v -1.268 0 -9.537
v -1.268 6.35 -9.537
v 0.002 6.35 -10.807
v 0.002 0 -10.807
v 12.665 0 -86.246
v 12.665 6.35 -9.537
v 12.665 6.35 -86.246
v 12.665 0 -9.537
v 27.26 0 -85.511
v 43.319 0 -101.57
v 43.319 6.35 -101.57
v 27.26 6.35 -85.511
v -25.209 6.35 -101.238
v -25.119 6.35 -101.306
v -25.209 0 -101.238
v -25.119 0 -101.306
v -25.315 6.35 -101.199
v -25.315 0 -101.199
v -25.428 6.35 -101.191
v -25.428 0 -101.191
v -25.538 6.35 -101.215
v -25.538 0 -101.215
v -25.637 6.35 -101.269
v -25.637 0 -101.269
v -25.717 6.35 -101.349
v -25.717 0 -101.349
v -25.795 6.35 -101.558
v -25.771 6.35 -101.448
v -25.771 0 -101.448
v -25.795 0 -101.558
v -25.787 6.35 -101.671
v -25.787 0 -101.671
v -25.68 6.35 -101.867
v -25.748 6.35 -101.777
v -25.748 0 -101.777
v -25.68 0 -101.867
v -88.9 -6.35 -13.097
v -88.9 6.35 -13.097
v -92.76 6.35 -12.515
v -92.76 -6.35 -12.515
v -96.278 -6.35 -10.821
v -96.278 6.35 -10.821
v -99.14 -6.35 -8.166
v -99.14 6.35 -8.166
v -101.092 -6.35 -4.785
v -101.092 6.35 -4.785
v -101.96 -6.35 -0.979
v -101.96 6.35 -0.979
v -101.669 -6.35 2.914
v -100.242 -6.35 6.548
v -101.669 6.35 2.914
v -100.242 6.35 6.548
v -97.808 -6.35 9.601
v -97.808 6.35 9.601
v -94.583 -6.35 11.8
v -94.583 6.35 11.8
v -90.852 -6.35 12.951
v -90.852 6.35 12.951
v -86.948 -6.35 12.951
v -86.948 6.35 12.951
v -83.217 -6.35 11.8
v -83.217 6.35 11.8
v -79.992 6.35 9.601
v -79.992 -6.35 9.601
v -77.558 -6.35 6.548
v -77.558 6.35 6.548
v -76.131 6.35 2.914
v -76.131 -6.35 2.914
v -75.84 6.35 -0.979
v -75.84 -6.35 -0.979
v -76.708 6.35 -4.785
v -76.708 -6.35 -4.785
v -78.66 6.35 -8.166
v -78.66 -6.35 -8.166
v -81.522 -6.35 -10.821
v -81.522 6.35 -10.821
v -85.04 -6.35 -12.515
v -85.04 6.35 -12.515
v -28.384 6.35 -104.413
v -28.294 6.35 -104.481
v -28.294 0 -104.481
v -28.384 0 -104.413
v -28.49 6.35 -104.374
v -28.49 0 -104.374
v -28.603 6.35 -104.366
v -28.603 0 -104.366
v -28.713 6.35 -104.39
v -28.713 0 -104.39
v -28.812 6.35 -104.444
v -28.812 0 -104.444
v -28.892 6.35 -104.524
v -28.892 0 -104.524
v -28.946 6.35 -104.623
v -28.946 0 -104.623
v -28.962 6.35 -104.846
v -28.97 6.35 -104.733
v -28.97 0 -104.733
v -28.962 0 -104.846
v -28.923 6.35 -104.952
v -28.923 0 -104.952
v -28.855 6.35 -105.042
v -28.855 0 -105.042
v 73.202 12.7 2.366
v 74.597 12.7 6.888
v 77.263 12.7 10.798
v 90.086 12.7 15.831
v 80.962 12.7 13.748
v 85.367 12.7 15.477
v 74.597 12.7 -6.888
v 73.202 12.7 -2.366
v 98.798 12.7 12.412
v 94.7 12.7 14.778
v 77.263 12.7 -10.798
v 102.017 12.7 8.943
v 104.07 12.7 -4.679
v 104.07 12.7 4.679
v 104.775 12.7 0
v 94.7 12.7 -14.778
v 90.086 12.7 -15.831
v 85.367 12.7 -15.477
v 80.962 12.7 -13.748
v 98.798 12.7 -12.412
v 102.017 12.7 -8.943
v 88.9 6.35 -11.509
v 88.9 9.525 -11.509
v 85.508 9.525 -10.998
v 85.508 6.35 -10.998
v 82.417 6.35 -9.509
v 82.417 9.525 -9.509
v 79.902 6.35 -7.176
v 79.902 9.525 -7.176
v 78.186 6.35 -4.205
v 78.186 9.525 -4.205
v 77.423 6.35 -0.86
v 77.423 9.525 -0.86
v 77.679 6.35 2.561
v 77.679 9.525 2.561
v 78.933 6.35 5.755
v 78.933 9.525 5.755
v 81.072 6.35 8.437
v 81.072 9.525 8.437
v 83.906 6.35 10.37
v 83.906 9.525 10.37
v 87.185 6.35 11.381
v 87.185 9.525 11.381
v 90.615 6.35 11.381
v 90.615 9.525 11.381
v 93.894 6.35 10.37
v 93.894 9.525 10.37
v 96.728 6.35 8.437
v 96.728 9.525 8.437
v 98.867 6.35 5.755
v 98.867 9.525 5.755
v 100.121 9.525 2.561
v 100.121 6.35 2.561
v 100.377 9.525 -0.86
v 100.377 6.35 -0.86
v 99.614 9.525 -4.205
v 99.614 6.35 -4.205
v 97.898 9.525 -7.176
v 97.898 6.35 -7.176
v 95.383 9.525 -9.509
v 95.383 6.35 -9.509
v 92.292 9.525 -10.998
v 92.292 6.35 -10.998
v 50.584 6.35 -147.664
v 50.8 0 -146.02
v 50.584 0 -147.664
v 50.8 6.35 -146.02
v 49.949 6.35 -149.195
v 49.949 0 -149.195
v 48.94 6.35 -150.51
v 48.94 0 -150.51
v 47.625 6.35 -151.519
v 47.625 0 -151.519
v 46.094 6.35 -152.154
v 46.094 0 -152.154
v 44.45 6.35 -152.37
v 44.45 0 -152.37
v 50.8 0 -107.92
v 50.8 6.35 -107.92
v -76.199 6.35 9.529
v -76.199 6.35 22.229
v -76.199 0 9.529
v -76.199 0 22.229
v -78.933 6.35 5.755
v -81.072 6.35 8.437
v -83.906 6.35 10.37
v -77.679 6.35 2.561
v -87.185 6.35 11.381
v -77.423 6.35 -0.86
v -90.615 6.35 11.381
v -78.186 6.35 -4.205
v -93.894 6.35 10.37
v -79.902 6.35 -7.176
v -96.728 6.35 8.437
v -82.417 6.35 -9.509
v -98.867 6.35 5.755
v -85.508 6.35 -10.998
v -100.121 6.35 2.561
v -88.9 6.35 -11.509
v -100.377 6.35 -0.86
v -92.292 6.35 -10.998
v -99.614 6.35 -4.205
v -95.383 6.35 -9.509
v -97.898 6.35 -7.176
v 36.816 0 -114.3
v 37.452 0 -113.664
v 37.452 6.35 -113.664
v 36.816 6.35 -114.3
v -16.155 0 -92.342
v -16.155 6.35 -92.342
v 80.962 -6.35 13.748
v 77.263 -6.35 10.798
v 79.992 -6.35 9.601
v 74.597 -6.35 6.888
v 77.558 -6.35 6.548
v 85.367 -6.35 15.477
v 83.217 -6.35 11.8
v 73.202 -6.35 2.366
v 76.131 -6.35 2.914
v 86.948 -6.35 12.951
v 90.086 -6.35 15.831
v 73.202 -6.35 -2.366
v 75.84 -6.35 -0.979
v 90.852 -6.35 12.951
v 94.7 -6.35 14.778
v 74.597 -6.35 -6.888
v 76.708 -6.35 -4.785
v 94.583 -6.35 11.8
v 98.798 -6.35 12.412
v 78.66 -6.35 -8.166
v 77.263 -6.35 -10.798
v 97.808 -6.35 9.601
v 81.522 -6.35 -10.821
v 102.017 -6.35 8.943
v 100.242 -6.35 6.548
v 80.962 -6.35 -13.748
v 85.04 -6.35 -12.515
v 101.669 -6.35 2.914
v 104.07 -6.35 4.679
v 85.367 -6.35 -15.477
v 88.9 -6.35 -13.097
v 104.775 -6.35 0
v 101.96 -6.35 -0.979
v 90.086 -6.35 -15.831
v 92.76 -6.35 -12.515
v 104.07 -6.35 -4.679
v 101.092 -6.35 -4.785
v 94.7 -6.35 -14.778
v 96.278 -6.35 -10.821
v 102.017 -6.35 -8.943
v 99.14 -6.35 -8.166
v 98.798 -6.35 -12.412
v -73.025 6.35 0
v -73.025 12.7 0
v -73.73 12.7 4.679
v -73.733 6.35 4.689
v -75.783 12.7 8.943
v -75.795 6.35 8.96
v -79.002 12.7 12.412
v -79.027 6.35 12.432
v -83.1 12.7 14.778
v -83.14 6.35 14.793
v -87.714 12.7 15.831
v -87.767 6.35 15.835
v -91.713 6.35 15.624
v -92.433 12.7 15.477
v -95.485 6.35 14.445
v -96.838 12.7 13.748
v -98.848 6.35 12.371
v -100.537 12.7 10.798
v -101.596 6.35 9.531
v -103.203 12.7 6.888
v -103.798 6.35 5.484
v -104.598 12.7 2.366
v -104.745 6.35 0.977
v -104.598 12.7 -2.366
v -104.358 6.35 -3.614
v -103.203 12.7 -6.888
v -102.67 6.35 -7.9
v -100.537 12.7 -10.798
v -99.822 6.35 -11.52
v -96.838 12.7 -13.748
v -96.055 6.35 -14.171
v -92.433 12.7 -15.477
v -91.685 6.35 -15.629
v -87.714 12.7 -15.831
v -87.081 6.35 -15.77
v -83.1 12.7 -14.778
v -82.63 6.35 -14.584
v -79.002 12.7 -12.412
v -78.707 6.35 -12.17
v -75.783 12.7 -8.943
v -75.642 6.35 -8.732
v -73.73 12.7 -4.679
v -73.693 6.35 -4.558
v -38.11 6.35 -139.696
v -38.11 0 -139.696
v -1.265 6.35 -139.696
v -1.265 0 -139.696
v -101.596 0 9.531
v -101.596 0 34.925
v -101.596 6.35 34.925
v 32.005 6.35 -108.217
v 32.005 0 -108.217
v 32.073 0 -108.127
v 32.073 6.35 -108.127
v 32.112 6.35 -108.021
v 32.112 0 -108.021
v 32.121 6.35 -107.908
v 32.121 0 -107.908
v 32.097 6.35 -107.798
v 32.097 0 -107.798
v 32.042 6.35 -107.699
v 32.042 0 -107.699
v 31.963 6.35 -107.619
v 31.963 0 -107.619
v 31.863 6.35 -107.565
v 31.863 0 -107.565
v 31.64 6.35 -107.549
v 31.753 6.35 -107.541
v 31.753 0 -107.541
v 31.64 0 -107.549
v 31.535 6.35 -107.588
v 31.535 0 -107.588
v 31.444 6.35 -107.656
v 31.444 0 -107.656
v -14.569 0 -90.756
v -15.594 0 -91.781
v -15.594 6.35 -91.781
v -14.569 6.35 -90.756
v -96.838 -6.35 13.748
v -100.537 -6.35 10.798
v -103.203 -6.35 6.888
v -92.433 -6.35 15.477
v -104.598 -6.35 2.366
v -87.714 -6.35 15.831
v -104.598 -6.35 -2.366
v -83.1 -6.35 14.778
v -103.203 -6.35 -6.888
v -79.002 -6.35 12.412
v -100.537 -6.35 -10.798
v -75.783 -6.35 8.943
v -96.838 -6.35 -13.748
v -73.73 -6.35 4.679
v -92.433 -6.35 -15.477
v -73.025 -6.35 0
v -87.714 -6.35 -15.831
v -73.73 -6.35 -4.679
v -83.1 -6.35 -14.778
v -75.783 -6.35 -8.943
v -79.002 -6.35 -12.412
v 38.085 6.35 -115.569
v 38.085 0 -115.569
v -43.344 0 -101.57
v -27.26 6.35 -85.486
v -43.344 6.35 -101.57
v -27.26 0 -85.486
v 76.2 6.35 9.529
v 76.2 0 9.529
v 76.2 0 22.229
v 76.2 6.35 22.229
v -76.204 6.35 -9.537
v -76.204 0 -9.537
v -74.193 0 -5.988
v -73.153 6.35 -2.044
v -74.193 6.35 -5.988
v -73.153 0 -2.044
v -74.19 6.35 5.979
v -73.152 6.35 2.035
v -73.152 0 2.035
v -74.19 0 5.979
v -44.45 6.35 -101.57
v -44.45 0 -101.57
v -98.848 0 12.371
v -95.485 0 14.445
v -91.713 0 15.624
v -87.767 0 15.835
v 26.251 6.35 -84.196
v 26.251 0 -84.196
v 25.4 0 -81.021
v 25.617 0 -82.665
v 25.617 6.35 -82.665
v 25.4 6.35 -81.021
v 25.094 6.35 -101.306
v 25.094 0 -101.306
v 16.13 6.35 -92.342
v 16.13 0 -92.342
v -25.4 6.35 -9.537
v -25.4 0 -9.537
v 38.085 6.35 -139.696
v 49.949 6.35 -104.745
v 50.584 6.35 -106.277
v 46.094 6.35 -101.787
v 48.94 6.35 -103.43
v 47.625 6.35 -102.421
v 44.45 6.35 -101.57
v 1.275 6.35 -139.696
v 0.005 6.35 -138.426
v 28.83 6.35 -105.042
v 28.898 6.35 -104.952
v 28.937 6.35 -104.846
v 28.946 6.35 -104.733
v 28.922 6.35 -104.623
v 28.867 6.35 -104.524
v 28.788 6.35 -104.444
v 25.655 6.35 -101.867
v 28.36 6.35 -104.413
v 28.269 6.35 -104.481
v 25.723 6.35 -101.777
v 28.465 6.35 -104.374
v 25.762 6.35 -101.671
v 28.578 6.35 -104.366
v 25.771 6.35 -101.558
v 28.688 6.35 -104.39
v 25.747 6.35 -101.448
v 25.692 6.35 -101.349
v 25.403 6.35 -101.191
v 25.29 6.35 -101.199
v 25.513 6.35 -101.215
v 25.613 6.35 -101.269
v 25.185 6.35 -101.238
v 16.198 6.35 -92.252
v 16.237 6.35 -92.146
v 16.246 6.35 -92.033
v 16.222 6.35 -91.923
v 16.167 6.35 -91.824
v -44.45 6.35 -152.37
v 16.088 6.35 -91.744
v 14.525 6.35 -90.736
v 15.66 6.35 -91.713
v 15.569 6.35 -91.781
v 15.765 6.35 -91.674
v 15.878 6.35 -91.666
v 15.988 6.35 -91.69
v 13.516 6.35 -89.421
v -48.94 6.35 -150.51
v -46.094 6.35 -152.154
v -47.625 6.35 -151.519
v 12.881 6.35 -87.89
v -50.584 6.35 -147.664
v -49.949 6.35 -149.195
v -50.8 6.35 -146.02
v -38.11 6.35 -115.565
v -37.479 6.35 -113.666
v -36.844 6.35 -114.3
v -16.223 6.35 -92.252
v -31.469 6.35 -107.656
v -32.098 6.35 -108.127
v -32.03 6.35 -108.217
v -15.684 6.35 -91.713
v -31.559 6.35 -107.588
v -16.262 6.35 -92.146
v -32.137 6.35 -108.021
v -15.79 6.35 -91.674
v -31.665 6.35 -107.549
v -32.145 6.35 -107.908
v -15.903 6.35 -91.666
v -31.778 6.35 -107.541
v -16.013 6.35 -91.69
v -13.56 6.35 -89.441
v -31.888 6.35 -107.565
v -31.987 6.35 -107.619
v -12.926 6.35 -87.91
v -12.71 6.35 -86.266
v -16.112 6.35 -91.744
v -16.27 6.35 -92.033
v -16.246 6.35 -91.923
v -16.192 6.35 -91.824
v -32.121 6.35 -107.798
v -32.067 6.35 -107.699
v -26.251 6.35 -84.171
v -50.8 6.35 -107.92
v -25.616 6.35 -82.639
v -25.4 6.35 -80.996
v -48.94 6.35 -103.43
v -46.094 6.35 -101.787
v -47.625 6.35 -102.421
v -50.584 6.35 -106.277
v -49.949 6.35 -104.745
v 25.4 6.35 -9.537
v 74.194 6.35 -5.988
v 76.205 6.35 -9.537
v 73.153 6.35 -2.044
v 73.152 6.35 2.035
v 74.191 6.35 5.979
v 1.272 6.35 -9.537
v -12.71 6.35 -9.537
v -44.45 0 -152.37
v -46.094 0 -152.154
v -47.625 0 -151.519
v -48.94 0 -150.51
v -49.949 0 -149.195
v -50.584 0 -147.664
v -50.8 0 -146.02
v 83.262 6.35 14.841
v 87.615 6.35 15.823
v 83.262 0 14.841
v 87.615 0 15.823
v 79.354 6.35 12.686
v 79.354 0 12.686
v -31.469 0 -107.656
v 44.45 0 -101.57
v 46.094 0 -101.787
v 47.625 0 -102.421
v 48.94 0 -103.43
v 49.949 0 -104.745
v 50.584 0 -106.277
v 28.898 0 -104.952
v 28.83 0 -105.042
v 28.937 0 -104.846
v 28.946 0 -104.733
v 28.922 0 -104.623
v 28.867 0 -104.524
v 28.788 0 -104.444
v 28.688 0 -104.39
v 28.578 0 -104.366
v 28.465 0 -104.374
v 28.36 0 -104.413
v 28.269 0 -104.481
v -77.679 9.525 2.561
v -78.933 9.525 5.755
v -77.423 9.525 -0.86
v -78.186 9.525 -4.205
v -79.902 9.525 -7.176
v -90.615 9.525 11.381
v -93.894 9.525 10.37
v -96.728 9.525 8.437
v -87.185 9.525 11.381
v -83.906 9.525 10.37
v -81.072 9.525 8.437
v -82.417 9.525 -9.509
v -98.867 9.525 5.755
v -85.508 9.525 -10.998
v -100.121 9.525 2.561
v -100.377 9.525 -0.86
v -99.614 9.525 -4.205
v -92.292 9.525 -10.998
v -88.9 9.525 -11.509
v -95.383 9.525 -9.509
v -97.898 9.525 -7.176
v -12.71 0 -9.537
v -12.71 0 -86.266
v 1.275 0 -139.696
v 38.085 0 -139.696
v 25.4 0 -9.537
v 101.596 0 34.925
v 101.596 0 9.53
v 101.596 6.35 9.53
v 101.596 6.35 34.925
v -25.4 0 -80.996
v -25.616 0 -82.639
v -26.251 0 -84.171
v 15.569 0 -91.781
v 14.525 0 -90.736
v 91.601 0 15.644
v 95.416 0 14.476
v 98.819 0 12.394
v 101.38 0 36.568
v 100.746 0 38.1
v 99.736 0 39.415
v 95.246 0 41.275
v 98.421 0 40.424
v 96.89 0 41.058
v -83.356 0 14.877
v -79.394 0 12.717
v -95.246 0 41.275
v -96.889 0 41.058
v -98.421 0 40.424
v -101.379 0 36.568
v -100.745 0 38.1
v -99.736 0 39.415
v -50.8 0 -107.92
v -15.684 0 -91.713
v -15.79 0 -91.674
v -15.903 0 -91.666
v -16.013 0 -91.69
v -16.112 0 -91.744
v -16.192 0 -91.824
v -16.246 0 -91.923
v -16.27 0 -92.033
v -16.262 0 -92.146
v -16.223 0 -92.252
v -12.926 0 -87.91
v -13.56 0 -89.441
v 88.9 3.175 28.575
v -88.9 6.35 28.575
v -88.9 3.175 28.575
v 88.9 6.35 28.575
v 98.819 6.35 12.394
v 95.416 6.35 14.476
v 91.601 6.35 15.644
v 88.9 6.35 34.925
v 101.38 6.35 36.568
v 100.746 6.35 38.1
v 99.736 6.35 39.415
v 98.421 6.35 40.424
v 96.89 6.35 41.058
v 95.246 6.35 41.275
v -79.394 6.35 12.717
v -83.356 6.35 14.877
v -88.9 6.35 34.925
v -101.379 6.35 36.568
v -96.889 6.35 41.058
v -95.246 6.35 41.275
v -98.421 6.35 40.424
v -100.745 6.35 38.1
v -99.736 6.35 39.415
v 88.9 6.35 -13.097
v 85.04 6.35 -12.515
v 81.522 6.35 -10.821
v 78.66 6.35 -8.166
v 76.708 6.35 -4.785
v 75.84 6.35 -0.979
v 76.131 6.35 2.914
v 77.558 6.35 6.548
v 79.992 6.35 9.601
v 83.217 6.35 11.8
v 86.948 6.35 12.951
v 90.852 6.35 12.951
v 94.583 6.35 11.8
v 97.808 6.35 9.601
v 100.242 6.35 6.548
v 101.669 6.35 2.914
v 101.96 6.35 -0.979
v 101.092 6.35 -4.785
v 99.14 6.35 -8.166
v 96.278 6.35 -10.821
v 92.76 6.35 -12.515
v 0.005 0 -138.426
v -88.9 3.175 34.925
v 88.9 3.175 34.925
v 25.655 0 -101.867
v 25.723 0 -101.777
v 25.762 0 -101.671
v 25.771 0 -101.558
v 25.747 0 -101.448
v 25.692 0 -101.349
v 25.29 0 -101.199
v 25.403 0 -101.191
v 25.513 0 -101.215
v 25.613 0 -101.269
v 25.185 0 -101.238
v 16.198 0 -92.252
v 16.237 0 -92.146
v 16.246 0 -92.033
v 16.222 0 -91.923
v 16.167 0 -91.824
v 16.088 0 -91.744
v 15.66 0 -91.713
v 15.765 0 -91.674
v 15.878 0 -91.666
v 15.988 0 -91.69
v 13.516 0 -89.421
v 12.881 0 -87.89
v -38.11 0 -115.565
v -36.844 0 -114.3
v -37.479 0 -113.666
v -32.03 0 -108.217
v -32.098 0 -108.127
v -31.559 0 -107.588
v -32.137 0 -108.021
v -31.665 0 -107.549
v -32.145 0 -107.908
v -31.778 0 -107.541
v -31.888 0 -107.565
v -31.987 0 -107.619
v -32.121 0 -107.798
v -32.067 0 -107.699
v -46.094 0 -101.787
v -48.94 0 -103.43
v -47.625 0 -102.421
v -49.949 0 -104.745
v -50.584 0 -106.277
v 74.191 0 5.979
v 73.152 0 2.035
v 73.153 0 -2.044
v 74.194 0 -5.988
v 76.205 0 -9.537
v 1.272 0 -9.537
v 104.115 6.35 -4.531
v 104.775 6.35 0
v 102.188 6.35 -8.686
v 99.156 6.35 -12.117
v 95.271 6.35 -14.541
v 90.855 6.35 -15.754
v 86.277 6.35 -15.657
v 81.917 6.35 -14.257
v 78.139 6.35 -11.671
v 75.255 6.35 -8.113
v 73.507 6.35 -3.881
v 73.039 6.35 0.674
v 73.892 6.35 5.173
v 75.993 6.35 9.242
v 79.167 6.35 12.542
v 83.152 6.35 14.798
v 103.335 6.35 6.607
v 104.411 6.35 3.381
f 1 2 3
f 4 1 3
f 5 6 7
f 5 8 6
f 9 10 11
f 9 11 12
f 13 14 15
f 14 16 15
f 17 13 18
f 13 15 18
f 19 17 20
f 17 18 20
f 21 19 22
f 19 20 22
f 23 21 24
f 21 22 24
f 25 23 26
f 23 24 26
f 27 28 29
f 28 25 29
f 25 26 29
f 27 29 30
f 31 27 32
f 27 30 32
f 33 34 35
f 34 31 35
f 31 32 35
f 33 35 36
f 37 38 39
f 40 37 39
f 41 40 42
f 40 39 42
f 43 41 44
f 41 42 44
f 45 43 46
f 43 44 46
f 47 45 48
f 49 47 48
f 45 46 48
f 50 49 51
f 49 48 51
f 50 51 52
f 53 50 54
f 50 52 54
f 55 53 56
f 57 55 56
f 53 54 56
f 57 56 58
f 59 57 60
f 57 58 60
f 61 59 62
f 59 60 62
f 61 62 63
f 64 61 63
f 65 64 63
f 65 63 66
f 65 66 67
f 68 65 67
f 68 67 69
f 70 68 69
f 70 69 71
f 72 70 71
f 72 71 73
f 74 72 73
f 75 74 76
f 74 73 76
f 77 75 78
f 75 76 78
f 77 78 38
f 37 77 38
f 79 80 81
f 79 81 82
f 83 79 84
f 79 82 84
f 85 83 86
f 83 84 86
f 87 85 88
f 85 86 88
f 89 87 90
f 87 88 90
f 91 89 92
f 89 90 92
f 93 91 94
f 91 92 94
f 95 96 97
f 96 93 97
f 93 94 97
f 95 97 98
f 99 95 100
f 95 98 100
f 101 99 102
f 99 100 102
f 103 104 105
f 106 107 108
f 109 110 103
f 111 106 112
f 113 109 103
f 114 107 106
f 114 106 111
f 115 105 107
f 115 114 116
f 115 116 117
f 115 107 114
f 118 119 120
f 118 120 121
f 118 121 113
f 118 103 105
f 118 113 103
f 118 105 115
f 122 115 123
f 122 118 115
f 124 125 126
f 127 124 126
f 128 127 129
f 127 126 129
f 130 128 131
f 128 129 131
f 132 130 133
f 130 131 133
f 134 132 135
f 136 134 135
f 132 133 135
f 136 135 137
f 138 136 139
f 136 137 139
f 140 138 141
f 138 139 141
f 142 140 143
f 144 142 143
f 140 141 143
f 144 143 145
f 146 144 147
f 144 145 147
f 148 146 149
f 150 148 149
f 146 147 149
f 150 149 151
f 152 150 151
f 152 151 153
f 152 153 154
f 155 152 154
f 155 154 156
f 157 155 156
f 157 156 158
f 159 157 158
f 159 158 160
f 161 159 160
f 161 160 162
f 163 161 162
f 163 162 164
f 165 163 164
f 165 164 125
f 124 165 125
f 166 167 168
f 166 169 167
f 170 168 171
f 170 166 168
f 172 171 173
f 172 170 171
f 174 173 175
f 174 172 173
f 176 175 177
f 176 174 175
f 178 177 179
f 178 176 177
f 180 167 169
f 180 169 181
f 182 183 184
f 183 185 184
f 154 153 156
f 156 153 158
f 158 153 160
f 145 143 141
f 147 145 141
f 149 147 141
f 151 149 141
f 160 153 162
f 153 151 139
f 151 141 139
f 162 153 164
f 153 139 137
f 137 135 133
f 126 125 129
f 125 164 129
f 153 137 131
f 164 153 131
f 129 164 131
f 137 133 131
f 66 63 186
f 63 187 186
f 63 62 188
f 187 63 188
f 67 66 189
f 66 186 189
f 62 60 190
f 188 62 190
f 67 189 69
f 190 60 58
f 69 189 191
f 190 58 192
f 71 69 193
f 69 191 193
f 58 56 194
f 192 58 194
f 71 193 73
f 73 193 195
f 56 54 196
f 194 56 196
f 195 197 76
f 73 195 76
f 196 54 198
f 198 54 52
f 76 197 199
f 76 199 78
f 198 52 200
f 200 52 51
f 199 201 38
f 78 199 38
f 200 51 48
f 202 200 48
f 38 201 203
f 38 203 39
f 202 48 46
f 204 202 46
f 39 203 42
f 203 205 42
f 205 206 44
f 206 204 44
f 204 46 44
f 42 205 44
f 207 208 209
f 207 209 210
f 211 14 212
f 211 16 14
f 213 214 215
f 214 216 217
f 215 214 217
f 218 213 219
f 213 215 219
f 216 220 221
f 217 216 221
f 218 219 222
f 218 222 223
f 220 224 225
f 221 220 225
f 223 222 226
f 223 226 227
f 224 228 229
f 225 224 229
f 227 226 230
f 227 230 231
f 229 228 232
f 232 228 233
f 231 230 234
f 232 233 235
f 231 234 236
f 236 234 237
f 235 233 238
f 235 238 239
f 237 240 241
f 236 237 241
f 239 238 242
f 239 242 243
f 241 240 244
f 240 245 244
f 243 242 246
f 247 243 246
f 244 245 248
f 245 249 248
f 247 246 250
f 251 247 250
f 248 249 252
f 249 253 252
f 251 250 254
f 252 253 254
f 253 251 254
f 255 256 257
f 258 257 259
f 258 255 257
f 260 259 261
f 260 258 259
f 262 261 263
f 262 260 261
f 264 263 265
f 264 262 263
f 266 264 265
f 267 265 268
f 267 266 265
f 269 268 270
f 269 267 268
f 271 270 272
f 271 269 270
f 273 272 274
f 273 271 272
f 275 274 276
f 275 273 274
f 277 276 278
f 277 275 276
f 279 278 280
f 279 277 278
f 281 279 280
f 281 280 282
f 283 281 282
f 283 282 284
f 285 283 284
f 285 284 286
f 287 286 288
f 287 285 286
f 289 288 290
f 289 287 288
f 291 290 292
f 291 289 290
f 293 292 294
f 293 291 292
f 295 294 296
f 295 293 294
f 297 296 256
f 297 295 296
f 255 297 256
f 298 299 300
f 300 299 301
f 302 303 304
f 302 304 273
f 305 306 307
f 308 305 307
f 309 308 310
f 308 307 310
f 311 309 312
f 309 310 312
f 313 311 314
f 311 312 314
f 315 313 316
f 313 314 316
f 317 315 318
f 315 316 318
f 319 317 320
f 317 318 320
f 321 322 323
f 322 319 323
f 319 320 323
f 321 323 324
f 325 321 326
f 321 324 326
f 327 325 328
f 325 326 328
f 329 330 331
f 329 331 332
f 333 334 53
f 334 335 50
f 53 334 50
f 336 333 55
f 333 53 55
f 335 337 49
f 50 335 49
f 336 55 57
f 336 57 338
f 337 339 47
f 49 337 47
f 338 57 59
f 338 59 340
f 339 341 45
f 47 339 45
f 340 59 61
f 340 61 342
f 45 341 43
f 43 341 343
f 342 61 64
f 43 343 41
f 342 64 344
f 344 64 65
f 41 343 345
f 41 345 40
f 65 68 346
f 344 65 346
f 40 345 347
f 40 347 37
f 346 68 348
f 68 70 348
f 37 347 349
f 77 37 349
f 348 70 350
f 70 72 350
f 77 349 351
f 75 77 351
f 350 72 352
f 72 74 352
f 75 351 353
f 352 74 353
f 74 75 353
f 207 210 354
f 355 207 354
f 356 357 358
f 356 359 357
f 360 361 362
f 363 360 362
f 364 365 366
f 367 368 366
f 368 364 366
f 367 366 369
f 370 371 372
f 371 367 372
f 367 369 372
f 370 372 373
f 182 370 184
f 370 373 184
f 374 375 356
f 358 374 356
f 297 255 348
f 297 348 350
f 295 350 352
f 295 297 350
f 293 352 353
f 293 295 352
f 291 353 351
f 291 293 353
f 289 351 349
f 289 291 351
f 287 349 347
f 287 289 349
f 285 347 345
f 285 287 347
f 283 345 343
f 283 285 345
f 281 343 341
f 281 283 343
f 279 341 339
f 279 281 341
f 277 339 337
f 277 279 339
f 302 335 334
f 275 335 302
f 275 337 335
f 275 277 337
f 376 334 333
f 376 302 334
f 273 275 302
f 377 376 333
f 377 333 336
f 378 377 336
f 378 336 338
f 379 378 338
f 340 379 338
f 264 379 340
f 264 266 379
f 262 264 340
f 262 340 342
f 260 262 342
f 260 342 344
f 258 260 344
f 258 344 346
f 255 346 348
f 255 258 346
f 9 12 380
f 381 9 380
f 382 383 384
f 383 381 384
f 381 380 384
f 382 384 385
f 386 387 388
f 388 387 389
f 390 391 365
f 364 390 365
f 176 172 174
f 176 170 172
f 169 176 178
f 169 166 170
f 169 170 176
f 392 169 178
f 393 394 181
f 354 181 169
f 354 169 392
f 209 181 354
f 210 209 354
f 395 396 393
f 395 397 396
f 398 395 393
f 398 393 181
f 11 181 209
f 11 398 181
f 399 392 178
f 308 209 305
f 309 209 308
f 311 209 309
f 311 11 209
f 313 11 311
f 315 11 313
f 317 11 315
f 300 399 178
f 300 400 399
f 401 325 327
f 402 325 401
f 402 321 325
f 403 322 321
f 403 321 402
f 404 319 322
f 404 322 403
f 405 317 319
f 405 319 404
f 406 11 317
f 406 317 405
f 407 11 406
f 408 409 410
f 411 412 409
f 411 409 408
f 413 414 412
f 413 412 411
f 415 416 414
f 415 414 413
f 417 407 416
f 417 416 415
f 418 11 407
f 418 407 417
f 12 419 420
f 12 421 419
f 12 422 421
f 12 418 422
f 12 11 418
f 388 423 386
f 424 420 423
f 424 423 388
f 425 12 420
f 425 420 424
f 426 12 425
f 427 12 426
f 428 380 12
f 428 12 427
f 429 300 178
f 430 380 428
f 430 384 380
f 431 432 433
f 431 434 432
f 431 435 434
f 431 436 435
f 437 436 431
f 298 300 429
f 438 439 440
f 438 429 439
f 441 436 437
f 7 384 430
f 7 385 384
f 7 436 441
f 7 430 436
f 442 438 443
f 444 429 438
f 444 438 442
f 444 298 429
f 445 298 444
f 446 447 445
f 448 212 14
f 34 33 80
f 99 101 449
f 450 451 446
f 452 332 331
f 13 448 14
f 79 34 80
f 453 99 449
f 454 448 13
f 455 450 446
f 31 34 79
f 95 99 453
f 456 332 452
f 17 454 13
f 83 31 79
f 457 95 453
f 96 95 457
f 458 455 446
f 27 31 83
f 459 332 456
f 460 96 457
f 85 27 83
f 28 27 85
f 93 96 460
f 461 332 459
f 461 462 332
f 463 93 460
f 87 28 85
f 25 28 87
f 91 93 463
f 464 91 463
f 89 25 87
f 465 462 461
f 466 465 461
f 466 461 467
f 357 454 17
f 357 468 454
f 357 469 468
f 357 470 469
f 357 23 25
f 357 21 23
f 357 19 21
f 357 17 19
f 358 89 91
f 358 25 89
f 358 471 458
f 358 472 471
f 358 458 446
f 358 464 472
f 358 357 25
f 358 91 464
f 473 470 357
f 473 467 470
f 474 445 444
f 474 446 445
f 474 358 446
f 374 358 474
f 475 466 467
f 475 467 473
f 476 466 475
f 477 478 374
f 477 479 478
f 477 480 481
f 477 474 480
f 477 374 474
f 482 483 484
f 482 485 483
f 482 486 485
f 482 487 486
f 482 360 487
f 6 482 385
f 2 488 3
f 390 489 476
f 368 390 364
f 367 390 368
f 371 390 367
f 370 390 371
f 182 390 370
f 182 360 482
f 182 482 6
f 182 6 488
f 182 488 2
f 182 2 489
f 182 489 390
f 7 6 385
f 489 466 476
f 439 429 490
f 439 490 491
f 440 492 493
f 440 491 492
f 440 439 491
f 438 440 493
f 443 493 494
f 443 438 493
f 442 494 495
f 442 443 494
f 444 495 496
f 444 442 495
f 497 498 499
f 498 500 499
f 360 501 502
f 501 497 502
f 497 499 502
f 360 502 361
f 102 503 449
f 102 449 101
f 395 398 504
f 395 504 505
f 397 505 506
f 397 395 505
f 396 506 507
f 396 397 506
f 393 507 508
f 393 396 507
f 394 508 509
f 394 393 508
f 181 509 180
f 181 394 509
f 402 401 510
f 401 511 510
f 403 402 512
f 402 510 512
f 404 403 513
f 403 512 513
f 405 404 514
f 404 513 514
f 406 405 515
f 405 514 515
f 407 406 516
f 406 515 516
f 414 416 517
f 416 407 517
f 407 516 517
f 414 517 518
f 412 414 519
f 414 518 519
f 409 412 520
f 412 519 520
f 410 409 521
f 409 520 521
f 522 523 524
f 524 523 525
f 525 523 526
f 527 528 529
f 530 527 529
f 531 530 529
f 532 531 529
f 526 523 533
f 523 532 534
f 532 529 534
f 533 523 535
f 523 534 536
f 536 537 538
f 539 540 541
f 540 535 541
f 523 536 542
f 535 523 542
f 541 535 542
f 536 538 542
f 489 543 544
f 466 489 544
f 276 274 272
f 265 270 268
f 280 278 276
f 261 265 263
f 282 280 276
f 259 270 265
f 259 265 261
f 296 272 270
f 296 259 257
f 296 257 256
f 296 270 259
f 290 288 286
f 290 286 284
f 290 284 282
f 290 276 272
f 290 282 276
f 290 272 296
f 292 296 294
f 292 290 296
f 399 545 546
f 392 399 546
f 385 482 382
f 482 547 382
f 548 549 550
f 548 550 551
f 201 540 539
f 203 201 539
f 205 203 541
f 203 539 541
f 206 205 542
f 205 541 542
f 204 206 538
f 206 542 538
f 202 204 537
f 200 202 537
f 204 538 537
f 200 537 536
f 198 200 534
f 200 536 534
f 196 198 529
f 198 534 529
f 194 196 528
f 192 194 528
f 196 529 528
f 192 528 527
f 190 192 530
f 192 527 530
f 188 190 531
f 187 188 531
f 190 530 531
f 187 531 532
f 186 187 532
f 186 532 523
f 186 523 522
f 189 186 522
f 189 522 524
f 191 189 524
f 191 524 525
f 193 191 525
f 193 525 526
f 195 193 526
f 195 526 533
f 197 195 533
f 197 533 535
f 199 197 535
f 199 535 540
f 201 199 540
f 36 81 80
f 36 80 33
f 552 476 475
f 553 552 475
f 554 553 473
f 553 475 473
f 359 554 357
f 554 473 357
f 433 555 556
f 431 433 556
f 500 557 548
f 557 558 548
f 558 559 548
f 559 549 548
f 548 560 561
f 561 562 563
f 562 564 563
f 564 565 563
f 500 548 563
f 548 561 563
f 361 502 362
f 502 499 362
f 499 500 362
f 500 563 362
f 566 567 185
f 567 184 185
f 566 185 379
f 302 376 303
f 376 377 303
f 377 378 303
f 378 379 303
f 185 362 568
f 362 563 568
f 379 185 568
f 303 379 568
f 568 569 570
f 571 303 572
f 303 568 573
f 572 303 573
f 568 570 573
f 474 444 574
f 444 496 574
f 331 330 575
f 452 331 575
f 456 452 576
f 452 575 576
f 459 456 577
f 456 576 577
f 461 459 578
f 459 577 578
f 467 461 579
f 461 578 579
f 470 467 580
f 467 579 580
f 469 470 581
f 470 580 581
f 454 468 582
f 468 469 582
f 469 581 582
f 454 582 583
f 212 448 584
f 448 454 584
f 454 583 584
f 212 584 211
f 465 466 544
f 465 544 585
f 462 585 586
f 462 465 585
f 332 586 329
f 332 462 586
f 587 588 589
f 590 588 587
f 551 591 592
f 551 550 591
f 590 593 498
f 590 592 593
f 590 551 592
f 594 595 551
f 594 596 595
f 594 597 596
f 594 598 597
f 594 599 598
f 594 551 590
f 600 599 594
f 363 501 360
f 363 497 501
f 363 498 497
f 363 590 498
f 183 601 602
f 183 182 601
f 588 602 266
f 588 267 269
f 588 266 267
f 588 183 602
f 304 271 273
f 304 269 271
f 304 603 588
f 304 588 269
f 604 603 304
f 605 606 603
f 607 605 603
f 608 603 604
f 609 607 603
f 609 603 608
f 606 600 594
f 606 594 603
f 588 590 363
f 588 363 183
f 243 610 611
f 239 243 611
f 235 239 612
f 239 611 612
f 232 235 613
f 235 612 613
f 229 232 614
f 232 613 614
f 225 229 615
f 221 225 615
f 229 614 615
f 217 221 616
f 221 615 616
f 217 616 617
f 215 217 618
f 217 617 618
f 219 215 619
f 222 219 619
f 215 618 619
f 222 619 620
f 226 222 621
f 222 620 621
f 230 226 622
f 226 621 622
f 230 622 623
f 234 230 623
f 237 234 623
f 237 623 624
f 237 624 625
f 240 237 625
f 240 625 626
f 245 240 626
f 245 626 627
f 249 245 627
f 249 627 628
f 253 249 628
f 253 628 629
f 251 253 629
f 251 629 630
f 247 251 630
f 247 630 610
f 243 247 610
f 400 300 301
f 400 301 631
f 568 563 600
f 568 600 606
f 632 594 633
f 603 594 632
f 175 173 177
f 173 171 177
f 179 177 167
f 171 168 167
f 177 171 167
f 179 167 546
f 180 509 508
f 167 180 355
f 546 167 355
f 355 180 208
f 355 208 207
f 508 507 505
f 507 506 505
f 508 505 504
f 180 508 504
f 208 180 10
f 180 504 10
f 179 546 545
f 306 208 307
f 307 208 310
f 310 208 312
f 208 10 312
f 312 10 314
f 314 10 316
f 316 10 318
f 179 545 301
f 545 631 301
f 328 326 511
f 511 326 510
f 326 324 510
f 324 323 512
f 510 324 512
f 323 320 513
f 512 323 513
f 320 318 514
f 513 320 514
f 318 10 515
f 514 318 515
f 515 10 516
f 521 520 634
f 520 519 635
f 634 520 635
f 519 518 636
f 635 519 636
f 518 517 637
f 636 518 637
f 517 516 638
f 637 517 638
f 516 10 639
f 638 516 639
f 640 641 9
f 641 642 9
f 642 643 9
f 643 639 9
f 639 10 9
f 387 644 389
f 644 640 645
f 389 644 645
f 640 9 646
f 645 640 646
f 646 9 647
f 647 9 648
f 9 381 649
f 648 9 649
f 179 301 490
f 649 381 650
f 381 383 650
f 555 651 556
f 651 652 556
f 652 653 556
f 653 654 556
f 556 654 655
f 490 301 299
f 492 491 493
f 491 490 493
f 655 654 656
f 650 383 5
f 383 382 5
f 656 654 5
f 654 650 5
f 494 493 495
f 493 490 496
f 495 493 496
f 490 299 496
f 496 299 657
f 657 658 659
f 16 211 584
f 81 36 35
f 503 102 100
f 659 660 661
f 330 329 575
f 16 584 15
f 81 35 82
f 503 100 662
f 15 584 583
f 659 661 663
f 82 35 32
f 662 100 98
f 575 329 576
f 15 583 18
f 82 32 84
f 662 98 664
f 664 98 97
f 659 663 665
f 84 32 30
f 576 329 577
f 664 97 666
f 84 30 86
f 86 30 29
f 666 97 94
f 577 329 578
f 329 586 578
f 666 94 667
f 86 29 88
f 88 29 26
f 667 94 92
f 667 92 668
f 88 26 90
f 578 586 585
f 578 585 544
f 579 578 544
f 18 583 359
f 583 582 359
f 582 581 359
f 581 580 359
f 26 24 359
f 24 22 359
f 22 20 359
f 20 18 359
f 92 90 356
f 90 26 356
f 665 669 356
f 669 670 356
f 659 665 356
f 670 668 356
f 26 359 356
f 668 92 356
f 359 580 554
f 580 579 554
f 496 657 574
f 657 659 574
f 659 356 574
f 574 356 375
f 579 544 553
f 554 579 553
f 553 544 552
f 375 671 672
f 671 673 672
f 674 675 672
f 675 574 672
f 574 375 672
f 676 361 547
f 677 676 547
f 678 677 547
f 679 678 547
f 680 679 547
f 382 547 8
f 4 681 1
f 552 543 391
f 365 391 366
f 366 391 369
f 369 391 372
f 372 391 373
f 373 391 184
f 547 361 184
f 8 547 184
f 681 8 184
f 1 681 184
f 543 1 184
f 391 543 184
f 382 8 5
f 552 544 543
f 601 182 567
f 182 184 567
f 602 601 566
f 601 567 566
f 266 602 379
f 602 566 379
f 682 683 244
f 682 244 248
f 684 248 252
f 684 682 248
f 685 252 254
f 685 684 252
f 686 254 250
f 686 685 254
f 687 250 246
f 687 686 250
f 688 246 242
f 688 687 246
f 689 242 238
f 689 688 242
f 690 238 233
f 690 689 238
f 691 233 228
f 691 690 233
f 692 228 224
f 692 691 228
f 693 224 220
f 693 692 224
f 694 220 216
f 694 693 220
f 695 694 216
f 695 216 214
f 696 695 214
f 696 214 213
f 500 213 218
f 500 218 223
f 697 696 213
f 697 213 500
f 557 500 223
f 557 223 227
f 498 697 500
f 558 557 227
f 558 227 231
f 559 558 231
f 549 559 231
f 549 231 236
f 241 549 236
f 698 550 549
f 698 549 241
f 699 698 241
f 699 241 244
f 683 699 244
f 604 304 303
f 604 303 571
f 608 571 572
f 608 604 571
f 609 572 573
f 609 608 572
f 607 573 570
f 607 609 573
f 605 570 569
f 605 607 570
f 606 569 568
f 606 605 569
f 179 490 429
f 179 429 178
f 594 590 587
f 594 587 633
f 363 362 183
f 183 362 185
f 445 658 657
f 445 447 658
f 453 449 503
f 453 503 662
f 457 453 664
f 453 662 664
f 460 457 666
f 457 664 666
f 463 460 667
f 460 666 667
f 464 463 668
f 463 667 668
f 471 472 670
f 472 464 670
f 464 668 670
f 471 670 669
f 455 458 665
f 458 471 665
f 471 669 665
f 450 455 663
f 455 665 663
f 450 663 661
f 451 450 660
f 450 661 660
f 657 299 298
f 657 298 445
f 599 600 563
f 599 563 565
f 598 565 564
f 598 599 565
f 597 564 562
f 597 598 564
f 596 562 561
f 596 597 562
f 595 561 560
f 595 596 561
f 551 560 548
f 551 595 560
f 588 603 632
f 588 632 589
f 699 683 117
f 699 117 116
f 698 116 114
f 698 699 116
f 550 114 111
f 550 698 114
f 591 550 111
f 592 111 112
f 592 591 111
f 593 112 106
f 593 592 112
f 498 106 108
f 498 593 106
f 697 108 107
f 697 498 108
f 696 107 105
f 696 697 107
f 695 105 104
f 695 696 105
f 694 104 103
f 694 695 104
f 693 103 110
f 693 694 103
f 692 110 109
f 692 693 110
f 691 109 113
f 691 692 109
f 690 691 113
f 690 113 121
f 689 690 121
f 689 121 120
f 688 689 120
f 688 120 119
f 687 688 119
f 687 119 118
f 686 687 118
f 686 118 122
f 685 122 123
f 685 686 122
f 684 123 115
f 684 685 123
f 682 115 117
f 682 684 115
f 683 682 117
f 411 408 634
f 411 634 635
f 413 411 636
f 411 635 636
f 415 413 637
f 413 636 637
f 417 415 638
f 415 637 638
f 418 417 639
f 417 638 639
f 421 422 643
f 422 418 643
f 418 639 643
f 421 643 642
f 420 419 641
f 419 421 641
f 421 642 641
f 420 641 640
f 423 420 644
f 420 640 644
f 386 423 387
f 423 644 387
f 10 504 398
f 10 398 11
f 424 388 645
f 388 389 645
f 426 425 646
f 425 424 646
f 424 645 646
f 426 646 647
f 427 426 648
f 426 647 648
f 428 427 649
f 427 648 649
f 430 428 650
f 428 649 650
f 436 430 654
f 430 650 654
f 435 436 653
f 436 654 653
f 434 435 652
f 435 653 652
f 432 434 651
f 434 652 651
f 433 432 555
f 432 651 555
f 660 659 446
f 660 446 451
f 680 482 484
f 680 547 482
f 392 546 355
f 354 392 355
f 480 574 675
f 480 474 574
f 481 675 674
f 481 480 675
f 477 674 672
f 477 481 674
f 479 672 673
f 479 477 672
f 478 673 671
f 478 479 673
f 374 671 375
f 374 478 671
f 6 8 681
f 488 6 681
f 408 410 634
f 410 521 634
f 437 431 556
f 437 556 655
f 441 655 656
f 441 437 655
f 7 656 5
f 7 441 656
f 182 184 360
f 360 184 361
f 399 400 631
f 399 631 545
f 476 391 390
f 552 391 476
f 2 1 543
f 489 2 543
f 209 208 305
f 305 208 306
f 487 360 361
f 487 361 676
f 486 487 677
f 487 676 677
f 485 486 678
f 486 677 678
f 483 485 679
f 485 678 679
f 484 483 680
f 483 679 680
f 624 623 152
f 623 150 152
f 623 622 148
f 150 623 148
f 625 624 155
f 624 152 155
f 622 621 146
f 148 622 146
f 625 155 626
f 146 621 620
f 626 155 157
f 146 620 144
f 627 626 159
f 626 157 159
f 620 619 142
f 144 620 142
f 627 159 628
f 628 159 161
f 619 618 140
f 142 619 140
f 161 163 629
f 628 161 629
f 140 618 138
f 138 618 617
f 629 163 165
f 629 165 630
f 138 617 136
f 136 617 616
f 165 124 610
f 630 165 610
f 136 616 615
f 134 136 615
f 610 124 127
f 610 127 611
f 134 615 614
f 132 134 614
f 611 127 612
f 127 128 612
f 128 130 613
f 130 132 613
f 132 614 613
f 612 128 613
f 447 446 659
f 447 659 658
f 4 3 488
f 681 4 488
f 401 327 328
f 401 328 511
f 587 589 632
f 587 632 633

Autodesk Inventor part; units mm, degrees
ref_plane "YZ Plane" through (0, 0, 0) normal (1, 0, 0) x (0, 1, 0)
ref_plane "XZ Plane" through (0, 0, 0) normal (0, 1, 0) x (-1, 0, 0)
ref_plane "XY Plane" through (0, 0, 0) normal (0, 0, 1) x (1, 0, 0)
sketch "Sketch1" plane through (0, 0, 0) normal (0, 1, 0) x (-1, 0, 0)
  circle A0 centre (88.8958, -0.0003) radius 15.875
  circle A1 centre (-88.8963, -0.0003) radius 15.875
  line L0 (76.1991, 9.5291) -> (-76.1995, 9.5291)
  line L1 (-76.1995, 9.5291) -> (-76.1995, 22.2291)
  line L2 (-76.1995, 22.2291) -> (76.1991, 22.2291)
  line L3 (76.1991, 22.2291) -> (76.1991, 9.5291)
  line L4 (-101.5963, 9.5247) -> (-101.5963, 41.2747)
  line L5 (-101.5963, 41.2747) -> (101.5958, 41.2747)
  line L6 (101.5958, 41.2747) -> (101.5958, 9.5247)
  line L7 (38.1095, -139.6963) -> (-38.0846, -139.6963)
  line L8 (50.8, -152.3702) -> (-50.8, -152.3702)
  line L9 (25.3998, -9.5368) -> (25.3998, -58.2151)
  line L10 (-25.4002, -9.5368) -> (-25.4002, -58.2573)
  line L11 (-25.4002, -9.5368) -> (-76.2049, -9.5368)
  line L12 (-12.6648, -9.5368) -> (12.7095, -9.5368)
  line L13 (25.3998, -9.5368) -> (76.2044, -9.5368)
  line L14 (38.1095, -139.6963) -> (38.1095, -114.2963)
  line L15 (-38.0846, -139.6963) -> (-38.0846, -114.2963)
  line L16 (-50.8, -152.3702) -> (-50.8, -101.5702)
  line L17 (50.8, -152.3702) -> (50.8, -101.5702)
  line L18 (38.1095, -114.2963) -> (12.7095, -88.8963)
  line L19 (38.1095, -114.2963) -> (74.0305, -114.2963) construction
  line L20 (-38.0846, -114.2963) -> (-12.6648, -88.8764)
  line L21 (-38.0846, -114.2963) -> (-2.1355, -114.2963) construction
  line L22 (-12.6648, -9.5368) -> (-12.6648, -88.8764)
  line L23 (12.7095, -9.5368) -> (12.7095, -88.8963)
  line L24 (25.4095, -101.5963) -> (38.1095, -101.5963) construction
  line L25 (38.1095, -114.2963) -> (56.0749, -114.2963) construction
  line L26 (-25.3747, -101.5863) -> (-12.6747, -101.5863) construction
  line L27 (-25.4002, -58.2573) -> (-25.4002, -83.6514)
  line L28 (-50.8, -101.5702) -> (-43.3191, -101.5702)
  line L29 (-43.3191, -101.5702) -> (-25.4002, -83.6514)
  line L30 (25.3998, -58.2151) -> (25.3998, -83.6261)
  line L31 (50.8, -101.5702) -> (43.3439, -101.5702)
  line L32 (25.3998, -83.6261) -> (43.3439, -101.5702)
  point P0 (0, 0)
  dimension "d2" = 31.75
  dimension "d3" = 31.75
  dimension "d119" = 25.4
  dimension "d120" = 25.4
  dimension "d121" = 50.8
  dimension "d122" = 50.8
  dimension "d123" = 135
  dimension "d124" = 45
extrude "Extrusion1" add sketch "Sketch1" along normal blind 6.35 contours A0 L3 L2 L1 A1 L4 L5 L6 | L13 L9 L30 L32 L31 L17 L8 L16 L28 L29 L27 L10 L11 A1 L0 A0
sketch "Sketch6" plane through (0, 6.35, 0) normal (0, 1, 0) x (1, 0, 0)
  line L0 (1.2749, 139.6963) -> (-1.2651, 139.6963)
  line L1 (-1.2651, 139.6963) -> (0.0049, 138.4263)
  line L2 (0.0049, 138.4263) -> (1.2749, 139.6963)
  line L3 (38.0856, 115.57) -> (38.0856, 113.03)
  line L4 (38.0856, 113.03) -> (36.8156, 114.3)
  line L5 (36.8156, 114.3) -> (38.0856, 115.57)
  line L6 (-38.1144, 115.57) -> (-38.1144, 113.03)
  line L7 (-38.1144, 113.03) -> (-36.8444, 114.3)
  line L8 (-36.8444, 114.3) -> (-38.1144, 115.57)
  line L9 (12.6648, 9.5368) -> (-12.7095, 9.5368) projected
  line L10 (1.2721, 9.5368) -> (-1.2679, 9.5368)
  line L11 (-1.2679, 9.5368) -> (0.0021, 10.8068)
  line L12 (0.0021, 10.8068) -> (1.2721, 9.5368)
  point P0 (0, 0)
  point P1 (12.6626, 9.5405)
  point P2 (-12.6933, 9.5405)
  point P3 (-12.7095, 9.5368)
  dimension "d55" = 2.54
  dimension "d56" = 45
  dimension "d57" = 2.54
  dimension "d58" = 45
  dimension "d59" = 2.54
  dimension "d60" = 45
  dimension "d61" = 2.54
  dimension "d62" = 45
extrude "Extrusion4" add sketch "Sketch6" against normal blind 6.35
sketch "Sketch13" plane through (0, 6.35, 0) normal (0, 1, 0) x (1, 0, 0)
  circle A0 centre (-88.9, 0) radius 15.875
  circle A1 centre (88.9, 0) radius 15.875
  point P0 (0, 0)
  dimension "d130" = 31.75
  dimension "d131" = 31.75
extrude "Extrusion5" add sketch "Sketch13" along normal blind 6.35 and the other way blind 12.7
fillet "Fillet1" radius 6.35 10 edges at (101.5963, 3.175, 41.2747) (-101.5958, 3.175, 41.2747) (50.8, 3.175, -152.3702) (-50.8, 3.175, -152.3702) (-50.8, 3.175, -101.5702) (50.8, 3.175, -101.5702) (25.4002, 3.175, -83.6514) (-25.3998, 3.175, -83.6261) (12.6648, 3.175, -88.8764) (-12.7095, 3.175, -88.8963)
sketch "Sketch15" plane through (-88.9, -6.35, 0) normal (0, -1, 0) x (1, 0, 0)
  circle A0 centre (0, 0) radius 15.875 projected
  circle A1 centre (177.8, 0) radius 15.875 projected
  point P0 (88.9, 0)
hole "Hole10" at (-88.9, -6.35, 0) at (88.9, -6.35, 0) direction (0, 1, 0) diameter 26.1938 depth 12.7
sketch "Sketch17" plane through (-88.9, 6.35, 0) normal (0, -1, 0) x (1, 0, 0)
  circle A0 centre (0, 0) radius 13.0969 projected
  circle A1 centre (177.8, 0) radius 13.0969 projected
  point P0 (88.9, 0)
hole "Hole12" at (-88.9, 6.35, 0) at (88.9, 6.35, 0) direction (0, 1, 0) diameter 23.0187 depth 3.175
sketch "Sketch20" plane through (0, 6.35, 0) normal (0, 1, 0) x (1, 0, 0)
  line L0 (-25.3998, 9.5368) -> (-76.2044, 9.5368) projected
  line L1 (-14.5693, 90.7562) -> (-37.4788, 113.6656) projected
  line L2 (76.2049, 9.5368) -> (25.4002, 9.5368) projected
  line L3 (37.452, 113.6636) -> (14.5246, 90.7363) projected
  point P0 (0, 0)
  point P1 (31.7247, 107.9364)
  point P2 (-31.7495, 107.9364)
  dimension "d182" = 98.3996
  dimension "d183" = 0
  dimension "d184" = 98.3996
  dimension "d185" = 0
hole "Hole15" at (-31.7495, 6.35, -107.9364) at (31.7247, 6.35, -107.9364) direction (0, -1, 0) diameter 0.7937 end through all
sketch "Sketch21" plane through (0, 6.35, 0) normal (0, 1, 0) x (1, 0, 0)
  line L0 (-25.3998, 9.5368) -> (-76.2044, 9.5368) projected
  line L1 (-14.5693, 90.7562) -> (-31.4689, 107.6557) projected
  line L2 (76.2049, 9.5368) -> (25.4002, 9.5368) projected
  line L3 (31.4441, 107.6557) -> (14.5246, 90.7363) projected
  point P0 (0, 0)
  point P1 (28.5497, 104.7614)
  point P2 (-28.5745, 104.7614)
  dimension "d193" = 95.2246
  dimension "d194" = 0
  dimension "d202" = 95.2246
  dimension "d203" = 0
hole "Hole16" at (-28.5745, 6.35, -104.7614) at (28.5497, 6.35, -104.7614) direction (0, -1, 0) diameter 0.7937 end through all
sketch "Sketch22" plane through (0, 6.35, 0) normal (0, 1, 0) x (1, 0, 0)
  line L0 (-25.3998, 9.5368) -> (-76.2044, 9.5368) projected
  line L1 (-14.5693, 90.7562) -> (-28.2939, 104.4807) projected
  line L2 (76.2049, 9.5368) -> (25.4002, 9.5368) projected
  line L3 (28.2691, 104.4807) -> (14.5246, 90.7363) projected
  point P0 (0, 0)
  point P1 (25.3747, 101.5864)
  point P2 (-25.3995, 101.5864)
  dimension "d204" = 92.0496
  dimension "d205" = 0
  dimension "d206" = 92.0496
  dimension "d207" = 0
hole "Hole17" at (-25.3995, 6.35, -101.5864) at (25.3747, 6.35, -101.5864) direction (0, -1, 0) diameter 0.7937 end through all
sketch "Sketch23" plane through (0, 6.35, 0) normal (0, 1, 0) x (1, 0, 0)
  line L0 (-25.3998, 9.5368) -> (-76.2044, 9.5368) projected
  line L1 (-14.5693, 90.7562) -> (-25.1189, 101.3057) projected
  line L2 (76.2049, 9.5368) -> (25.4002, 9.5368) projected
  line L3 (25.0941, 101.3057) -> (14.5246, 90.7363) projected
  point P0 (0, 0)
  point P1 (15.8497, 92.0614)
  point P2 (-15.8745, 92.0614)
  dimension "d215" = 82.5246
  dimension "d216" = 0
  dimension "d217" = 82.5246
  dimension "d218" = 0
hole "Hole18" at (-15.8745, 6.35, -92.0614) at (15.8497, 6.35, -92.0614) direction (0, -1, 0) diameter 0.7937 end through all
sketch "Sketch25" plane through (0, 6.35, 0) normal (0, 1, 0) x (1, 0, 0)
  line L0 (-88.9, -28.575) -> (88.9, -28.575)
  line L1 (88.9, -28.575) -> (88.9, -34.925)
  line L2 (88.9, -34.925) -> (-88.9, -34.925)
  line L3 (-88.9, -34.925) -> (-88.9, -28.575)
  point P0 (0, 0)
extrude "Extrusion7" cut sketch "Sketch25" against normal blind 3.175
properties part number "Positioning tool mini VR"
